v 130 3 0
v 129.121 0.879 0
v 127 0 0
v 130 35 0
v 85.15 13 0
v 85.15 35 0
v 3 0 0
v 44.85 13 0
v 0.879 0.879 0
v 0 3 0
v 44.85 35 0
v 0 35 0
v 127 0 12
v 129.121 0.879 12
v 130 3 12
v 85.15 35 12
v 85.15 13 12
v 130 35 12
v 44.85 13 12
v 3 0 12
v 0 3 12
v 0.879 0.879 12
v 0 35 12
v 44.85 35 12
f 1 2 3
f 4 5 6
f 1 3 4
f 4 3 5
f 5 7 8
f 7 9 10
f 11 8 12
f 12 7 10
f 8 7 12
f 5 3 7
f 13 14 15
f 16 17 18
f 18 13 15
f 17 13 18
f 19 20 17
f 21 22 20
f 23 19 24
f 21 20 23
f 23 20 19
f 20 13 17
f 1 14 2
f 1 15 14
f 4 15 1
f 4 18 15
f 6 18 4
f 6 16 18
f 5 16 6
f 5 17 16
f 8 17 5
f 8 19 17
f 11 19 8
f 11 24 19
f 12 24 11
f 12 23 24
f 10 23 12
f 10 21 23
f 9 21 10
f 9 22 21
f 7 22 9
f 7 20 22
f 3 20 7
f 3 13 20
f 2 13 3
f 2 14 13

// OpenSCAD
$fn = 32;

// ----------------------------------------------------------------------
// Window plate: 130 x 35 mm, 1 open windows
// ----------------------------------------------------------------------

// --- parameters (mm) ---
profile_height = 12;      // extrusion height
profile_points = 12;      // points of the closed outline

profile = [[0, 3], [0.879, 0.879], [3, 0], [127, 0], [129.121, 0.879], [130, 3], [130, 35], [85.15, 35], [85.15, 13], [44.85, 13], [44.85, 35], [0, 35]];  // single closed polygon, 12 points, counter clockwise

// --- the one profile operation ---
linear_extrude(height = profile_height) polygon(points = profile);
